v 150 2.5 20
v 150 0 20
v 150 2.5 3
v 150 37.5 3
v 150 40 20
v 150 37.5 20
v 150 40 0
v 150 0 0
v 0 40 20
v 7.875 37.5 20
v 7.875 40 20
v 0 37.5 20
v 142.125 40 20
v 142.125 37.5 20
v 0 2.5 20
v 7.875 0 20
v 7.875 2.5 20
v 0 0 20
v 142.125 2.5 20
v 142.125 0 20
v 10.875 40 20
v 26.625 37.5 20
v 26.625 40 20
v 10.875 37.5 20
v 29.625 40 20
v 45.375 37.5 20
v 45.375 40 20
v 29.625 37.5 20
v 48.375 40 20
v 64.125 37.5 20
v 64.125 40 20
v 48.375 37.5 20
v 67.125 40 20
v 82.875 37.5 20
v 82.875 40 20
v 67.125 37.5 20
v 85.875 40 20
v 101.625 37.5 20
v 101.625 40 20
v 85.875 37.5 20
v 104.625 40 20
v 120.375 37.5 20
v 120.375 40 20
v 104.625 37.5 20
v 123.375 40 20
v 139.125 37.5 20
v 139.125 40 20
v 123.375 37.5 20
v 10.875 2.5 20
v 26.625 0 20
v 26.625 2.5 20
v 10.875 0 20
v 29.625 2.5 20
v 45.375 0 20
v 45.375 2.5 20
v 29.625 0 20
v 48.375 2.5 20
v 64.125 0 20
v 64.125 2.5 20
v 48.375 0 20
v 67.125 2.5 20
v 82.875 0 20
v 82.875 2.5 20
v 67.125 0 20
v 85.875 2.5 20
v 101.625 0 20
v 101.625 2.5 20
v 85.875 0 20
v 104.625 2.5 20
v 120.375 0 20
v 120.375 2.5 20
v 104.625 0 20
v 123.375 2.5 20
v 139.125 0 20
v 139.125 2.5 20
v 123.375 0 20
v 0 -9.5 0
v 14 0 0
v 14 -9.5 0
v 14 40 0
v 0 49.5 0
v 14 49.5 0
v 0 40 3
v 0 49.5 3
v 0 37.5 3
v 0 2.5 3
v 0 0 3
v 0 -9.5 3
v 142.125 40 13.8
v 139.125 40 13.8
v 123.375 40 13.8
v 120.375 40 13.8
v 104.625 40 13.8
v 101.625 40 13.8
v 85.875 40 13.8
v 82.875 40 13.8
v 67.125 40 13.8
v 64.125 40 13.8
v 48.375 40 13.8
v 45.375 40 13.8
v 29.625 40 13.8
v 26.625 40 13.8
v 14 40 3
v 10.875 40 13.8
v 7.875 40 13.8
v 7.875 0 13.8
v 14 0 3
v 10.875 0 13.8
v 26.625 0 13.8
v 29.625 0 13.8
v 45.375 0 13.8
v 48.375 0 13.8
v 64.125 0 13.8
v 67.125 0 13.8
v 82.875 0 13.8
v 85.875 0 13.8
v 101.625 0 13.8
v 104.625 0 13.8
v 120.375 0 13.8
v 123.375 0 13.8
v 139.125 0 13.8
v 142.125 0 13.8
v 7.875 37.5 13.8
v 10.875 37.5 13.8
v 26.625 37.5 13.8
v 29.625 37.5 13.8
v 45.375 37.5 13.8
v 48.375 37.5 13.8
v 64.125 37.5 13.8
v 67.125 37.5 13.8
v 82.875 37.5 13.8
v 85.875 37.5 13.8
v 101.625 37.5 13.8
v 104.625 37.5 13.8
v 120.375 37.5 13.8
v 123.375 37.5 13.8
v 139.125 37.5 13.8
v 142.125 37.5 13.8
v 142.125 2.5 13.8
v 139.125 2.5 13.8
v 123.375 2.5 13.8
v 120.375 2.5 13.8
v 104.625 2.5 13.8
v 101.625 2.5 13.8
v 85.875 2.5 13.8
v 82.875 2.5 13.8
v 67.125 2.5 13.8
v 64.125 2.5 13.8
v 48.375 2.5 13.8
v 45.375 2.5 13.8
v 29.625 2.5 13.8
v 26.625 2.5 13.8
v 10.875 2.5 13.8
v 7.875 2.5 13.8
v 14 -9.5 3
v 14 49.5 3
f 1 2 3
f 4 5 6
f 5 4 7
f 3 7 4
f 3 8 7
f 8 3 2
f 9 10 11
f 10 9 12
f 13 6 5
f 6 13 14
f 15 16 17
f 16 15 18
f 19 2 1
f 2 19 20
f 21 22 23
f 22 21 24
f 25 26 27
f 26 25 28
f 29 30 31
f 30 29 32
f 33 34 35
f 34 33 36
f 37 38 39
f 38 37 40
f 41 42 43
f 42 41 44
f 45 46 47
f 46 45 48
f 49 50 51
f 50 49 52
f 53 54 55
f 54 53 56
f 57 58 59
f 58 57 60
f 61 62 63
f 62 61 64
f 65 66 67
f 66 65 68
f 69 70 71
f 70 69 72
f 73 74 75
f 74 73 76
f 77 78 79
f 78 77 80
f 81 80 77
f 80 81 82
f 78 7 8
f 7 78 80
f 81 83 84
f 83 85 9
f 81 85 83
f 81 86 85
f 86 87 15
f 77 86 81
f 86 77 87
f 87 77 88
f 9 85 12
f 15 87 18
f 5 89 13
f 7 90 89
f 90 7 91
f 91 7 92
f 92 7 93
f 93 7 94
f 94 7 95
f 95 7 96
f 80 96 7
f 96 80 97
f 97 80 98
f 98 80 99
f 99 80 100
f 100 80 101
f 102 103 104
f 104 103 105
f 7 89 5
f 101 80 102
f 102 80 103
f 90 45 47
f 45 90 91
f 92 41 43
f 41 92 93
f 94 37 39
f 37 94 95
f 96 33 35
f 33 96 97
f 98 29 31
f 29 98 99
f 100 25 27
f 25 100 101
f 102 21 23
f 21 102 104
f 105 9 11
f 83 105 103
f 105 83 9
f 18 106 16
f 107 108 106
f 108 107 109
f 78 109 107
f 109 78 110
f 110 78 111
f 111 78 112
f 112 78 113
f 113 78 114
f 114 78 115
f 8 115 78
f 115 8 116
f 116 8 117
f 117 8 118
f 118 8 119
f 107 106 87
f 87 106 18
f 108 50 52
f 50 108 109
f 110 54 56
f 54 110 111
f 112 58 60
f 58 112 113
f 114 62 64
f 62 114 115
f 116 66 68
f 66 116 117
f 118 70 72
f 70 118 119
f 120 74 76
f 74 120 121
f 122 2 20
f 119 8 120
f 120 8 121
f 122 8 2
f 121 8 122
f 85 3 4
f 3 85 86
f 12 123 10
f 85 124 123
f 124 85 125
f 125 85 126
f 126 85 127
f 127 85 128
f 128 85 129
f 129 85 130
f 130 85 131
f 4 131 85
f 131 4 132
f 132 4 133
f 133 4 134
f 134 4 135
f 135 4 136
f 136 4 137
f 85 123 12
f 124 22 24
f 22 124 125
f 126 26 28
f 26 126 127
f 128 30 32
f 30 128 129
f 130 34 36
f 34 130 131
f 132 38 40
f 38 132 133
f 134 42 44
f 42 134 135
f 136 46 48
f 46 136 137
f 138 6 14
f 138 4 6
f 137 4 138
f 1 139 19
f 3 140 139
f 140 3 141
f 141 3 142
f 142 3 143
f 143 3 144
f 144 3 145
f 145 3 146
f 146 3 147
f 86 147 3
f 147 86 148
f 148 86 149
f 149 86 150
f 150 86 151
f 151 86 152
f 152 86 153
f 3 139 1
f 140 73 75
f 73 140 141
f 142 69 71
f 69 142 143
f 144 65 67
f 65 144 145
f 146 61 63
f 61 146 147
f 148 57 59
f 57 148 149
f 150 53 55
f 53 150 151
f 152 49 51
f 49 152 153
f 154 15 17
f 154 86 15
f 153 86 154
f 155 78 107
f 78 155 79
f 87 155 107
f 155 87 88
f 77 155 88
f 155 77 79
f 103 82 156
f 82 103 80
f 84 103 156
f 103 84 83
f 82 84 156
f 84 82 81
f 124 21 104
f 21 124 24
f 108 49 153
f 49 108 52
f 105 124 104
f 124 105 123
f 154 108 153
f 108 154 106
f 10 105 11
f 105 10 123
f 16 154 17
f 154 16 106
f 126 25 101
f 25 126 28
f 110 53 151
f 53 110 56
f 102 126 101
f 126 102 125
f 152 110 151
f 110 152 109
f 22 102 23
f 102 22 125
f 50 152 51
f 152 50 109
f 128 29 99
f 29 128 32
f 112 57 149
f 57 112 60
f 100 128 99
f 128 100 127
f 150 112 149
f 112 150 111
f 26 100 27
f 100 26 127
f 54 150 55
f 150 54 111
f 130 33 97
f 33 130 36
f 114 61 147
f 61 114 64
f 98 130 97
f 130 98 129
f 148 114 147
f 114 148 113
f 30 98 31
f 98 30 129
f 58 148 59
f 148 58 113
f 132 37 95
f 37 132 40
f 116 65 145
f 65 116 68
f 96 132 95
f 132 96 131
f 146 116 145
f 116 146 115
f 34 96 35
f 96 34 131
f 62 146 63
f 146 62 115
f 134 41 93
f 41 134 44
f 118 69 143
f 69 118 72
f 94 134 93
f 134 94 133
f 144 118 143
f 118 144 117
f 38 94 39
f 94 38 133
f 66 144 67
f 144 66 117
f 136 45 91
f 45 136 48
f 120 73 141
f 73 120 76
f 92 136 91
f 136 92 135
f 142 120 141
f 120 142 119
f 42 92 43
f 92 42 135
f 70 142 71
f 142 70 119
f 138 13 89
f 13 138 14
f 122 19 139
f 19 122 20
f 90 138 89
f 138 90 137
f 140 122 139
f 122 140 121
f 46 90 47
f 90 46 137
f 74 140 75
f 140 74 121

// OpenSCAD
$fn = 32;

// ----------------------------------------------------------------------
// Cable duct: 150 x 40 x 20 mm, 8 fingers
// ----------------------------------------------------------------------

// --- parameters (mm) ---
tray_len = 150;           // duct length, X
tray_w = 40;              // duct width, Y
tray_h = 20;              // duct height, Z
tray_t = 2.5;             // side wall thickness
floor_t = 3;              // floor thickness
slot_w = 3;               // finger slot width
slot_h = 10.8;            // finger slot height
fingers = 8;              // number of finger slots per side
pitch = 18.75;            // finger pitch
ear_w = 10.5;             // mounting ear width
ear_l = 14;               // mounting ear length

module shell() {
  difference() {
    cube([tray_len, tray_w, tray_h]);
    /* open top channel */
    translate([-tray_t - 1, tray_t, floor_t])
      cube([tray_len + 2 * tray_t + 2, tray_w - 2 * tray_t, tray_h + 1]);
  }
}

module ears() {
  translate([0, -ear_w + 1, 0]) cube([ear_l, ear_w, floor_t]);
  translate([0, tray_w - 1, 0]) cube([ear_l, ear_w, floor_t]);
}

difference() {
  union() {
    shell();
    ears();
  }
  /* finger slots cut through both side walls */
  for (i = [0 : fingers - 1]) translate([pitch / 2 + i * pitch - slot_w / 2, -1, floor_t + slot_h]) cube([slot_w, tray_w + 2, tray_h]);
}
